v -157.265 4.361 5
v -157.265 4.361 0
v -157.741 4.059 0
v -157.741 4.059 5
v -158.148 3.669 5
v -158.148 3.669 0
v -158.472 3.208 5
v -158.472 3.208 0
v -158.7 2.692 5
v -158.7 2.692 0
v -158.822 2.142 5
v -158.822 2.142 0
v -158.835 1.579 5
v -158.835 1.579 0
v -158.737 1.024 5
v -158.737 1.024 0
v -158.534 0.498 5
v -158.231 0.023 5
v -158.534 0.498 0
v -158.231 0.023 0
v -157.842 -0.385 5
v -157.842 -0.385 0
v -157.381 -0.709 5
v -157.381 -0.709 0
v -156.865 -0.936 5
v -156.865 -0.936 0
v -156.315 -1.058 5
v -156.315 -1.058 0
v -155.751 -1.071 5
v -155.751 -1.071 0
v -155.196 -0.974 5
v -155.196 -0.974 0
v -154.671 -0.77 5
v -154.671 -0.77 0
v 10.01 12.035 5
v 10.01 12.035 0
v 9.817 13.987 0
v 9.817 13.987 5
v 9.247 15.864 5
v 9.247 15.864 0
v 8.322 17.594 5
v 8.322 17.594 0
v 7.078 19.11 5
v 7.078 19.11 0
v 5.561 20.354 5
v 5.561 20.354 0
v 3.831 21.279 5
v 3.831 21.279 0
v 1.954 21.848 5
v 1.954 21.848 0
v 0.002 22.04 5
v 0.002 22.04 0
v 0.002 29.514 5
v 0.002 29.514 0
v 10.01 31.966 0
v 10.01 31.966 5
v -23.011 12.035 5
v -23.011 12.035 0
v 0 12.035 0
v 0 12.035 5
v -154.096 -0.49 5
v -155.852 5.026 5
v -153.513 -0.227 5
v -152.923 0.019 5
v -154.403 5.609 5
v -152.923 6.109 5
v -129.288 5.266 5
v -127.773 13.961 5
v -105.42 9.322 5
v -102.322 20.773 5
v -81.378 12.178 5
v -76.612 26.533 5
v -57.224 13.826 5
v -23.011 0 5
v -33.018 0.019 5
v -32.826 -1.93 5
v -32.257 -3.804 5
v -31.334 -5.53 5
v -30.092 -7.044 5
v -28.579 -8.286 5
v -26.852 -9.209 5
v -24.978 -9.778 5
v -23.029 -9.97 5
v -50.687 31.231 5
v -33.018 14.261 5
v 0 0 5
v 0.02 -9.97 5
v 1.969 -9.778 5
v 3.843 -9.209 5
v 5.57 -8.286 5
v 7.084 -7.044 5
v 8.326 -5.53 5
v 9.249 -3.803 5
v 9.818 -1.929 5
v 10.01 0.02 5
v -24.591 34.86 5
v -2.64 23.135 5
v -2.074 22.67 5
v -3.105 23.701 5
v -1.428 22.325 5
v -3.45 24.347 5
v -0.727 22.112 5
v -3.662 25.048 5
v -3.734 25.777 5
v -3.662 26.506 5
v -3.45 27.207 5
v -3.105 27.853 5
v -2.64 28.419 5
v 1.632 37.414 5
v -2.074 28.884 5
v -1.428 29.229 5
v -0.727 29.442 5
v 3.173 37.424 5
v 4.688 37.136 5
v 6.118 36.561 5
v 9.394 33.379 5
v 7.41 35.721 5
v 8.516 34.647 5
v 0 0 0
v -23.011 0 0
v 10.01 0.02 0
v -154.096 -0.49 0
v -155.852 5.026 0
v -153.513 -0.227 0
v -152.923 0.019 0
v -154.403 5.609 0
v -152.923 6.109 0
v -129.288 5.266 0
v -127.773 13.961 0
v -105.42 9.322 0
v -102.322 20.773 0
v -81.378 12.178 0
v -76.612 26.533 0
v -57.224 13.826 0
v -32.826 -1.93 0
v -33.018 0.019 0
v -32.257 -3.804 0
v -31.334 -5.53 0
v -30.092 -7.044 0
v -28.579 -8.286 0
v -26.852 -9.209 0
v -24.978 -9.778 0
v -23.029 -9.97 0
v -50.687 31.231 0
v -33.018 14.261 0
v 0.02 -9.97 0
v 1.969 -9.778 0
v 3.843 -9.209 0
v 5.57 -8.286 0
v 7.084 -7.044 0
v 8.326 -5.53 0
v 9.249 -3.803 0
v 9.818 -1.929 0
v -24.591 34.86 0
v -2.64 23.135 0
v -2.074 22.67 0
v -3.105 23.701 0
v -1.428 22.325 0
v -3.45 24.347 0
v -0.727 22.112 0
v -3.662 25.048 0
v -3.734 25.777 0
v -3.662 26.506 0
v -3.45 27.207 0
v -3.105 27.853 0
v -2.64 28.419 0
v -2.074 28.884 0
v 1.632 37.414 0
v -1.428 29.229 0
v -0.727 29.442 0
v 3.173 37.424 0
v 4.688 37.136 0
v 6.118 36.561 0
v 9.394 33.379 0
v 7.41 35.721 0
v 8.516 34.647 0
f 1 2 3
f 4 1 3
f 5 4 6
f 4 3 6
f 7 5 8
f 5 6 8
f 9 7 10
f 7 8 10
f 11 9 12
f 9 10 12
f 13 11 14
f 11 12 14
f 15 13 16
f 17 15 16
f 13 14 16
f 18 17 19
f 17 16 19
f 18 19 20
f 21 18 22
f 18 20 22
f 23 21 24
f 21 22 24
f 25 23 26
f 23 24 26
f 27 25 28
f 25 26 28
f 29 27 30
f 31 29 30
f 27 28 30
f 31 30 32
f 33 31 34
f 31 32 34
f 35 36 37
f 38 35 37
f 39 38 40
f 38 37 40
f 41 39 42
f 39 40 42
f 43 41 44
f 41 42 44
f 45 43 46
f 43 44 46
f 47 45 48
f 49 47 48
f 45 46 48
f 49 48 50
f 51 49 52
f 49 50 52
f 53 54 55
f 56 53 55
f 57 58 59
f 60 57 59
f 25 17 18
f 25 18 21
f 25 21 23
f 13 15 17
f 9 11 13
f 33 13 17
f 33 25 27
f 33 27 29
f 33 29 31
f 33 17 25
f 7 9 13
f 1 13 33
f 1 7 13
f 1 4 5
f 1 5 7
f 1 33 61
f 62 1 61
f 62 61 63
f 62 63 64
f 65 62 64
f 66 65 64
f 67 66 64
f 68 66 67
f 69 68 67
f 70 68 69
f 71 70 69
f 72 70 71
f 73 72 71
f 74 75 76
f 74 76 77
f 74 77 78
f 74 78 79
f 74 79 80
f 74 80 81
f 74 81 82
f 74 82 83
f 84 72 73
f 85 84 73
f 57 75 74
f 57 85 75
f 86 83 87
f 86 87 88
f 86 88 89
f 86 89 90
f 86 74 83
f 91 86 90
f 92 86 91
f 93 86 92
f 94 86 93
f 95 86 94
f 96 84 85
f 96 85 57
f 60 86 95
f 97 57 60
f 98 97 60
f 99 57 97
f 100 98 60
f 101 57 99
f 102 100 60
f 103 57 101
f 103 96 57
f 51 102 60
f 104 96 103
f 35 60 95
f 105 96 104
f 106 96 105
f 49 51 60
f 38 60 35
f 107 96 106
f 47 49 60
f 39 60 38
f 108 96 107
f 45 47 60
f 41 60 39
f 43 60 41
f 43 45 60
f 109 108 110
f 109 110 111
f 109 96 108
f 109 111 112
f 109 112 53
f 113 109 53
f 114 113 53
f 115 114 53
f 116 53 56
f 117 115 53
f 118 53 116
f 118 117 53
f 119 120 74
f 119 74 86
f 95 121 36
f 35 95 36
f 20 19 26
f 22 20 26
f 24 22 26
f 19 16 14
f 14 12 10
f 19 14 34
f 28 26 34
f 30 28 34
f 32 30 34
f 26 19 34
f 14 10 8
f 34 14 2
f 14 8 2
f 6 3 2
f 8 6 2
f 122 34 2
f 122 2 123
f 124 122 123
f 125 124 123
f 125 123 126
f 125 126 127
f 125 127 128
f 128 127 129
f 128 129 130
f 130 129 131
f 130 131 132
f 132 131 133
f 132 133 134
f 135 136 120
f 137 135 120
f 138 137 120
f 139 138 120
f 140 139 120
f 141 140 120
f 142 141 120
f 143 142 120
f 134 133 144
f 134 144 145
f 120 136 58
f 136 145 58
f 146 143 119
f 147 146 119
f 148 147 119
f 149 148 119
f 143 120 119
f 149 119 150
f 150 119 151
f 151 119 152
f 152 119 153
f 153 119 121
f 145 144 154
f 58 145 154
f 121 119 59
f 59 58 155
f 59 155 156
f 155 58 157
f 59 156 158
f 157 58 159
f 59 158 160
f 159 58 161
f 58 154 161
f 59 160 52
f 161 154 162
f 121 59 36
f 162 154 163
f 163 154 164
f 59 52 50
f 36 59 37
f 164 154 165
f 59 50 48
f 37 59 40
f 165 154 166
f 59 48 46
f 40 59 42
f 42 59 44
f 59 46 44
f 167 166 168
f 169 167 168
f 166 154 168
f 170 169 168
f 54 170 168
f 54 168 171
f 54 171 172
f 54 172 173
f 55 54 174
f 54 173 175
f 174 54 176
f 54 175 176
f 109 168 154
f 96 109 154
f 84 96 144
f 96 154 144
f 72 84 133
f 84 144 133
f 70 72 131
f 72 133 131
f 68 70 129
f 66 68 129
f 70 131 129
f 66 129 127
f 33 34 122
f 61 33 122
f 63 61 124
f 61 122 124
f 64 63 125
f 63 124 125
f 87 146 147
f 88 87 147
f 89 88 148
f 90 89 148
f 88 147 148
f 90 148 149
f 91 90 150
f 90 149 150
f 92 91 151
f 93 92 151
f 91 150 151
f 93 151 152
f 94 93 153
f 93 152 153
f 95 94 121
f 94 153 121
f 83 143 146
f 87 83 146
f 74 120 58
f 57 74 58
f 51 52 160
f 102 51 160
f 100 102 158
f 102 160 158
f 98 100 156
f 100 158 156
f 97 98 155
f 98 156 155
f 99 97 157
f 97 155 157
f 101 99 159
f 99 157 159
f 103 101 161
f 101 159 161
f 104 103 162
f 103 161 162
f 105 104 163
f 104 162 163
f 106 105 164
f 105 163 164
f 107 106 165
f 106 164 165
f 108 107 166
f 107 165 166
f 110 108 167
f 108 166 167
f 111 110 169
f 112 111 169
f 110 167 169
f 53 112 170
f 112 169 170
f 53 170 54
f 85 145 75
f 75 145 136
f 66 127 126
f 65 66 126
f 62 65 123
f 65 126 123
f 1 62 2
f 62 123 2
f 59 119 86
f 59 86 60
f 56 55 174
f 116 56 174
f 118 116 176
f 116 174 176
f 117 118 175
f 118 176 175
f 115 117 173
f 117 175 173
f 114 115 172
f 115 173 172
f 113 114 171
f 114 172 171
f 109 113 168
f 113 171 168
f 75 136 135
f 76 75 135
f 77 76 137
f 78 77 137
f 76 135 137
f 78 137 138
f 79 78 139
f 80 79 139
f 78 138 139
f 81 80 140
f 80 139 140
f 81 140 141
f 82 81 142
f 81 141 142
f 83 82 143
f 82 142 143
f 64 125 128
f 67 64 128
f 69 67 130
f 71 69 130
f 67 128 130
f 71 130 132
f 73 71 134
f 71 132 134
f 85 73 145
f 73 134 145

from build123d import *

# Parameters (mm, degrees)
SKETCH4_W           = 23.01079085
SKETCH4_H           = 12.035429775
BOSS_EXTRUDE1_DEPTH = 5


with BuildPart() as part:
    # Sketch4 → Boss-Extrude1 (new body)
    with BuildSketch(Plane.XY):
        with BuildLine():
            Line((-23.029498644, -9.969527596), (0.020059035, -9.969527596))
            ThreePointArc((0.020059035, -9.969527596), (7.083752781, -7.043649902), (10.009630666, 0.020043765))
            Line((10.009630666, 0.020043765), (10.009630666, 12.035429505))
            ThreePointArc((10.009630666, 12.035429505), (7.077737043, 19.110165135), (0.00232147, 22.0404175))
            ThreePointArc((0.00232147, 22.0404175), (-3.734235721, 25.776974691), (0.00232147, 29.513531883))
            Line((0.00232147, 29.513531883), (10.009630666, 31.965921786))
            ThreePointArc((10.009630666, 31.965921786), (6.784699168, 36.172527862), (1.631535857, 37.413747311))
            ThreePointArc((1.631535857, 37.413747311), (-76.612020645, 26.532654718), (-152.922807067, 6.10923224))
            ThreePointArc((-152.922807067, 6.10923224), (-155.131459045, 5.328115377), (-157.265351369, 4.361269649))
            ThreePointArc((-157.265351369, 4.361269649), (-158.533663589, 0.498259669), (-154.67065361, -0.770052551))
            ThreePointArc((-154.67065361, -0.770052551), (-153.805456008, -0.356328461), (-152.922807067, 0.018725346))
            ThreePointArc((-152.922807067, 0.018725346), (-93.417009782, 10.900895291), (-33.017751587, 14.261124841))
            Line((-33.017751587, 14.261124841), (-33.017751587, 12.035429775))
            Line((-33.017751587, 12.035429775), (-33.017751587, 0.018725346))
            ThreePointArc((-33.017751587, 0.018725346), (-30.092260032, -7.044036042), (-23.029498644, -9.969527596))
        make_face()
        with Locations((-11.505395425, 6.017714888)):
            Rectangle(SKETCH4_W, SKETCH4_H, mode=Mode.SUBTRACT)
    extrude(amount=BOSS_EXTRUDE1_DEPTH)


solid = part.part
